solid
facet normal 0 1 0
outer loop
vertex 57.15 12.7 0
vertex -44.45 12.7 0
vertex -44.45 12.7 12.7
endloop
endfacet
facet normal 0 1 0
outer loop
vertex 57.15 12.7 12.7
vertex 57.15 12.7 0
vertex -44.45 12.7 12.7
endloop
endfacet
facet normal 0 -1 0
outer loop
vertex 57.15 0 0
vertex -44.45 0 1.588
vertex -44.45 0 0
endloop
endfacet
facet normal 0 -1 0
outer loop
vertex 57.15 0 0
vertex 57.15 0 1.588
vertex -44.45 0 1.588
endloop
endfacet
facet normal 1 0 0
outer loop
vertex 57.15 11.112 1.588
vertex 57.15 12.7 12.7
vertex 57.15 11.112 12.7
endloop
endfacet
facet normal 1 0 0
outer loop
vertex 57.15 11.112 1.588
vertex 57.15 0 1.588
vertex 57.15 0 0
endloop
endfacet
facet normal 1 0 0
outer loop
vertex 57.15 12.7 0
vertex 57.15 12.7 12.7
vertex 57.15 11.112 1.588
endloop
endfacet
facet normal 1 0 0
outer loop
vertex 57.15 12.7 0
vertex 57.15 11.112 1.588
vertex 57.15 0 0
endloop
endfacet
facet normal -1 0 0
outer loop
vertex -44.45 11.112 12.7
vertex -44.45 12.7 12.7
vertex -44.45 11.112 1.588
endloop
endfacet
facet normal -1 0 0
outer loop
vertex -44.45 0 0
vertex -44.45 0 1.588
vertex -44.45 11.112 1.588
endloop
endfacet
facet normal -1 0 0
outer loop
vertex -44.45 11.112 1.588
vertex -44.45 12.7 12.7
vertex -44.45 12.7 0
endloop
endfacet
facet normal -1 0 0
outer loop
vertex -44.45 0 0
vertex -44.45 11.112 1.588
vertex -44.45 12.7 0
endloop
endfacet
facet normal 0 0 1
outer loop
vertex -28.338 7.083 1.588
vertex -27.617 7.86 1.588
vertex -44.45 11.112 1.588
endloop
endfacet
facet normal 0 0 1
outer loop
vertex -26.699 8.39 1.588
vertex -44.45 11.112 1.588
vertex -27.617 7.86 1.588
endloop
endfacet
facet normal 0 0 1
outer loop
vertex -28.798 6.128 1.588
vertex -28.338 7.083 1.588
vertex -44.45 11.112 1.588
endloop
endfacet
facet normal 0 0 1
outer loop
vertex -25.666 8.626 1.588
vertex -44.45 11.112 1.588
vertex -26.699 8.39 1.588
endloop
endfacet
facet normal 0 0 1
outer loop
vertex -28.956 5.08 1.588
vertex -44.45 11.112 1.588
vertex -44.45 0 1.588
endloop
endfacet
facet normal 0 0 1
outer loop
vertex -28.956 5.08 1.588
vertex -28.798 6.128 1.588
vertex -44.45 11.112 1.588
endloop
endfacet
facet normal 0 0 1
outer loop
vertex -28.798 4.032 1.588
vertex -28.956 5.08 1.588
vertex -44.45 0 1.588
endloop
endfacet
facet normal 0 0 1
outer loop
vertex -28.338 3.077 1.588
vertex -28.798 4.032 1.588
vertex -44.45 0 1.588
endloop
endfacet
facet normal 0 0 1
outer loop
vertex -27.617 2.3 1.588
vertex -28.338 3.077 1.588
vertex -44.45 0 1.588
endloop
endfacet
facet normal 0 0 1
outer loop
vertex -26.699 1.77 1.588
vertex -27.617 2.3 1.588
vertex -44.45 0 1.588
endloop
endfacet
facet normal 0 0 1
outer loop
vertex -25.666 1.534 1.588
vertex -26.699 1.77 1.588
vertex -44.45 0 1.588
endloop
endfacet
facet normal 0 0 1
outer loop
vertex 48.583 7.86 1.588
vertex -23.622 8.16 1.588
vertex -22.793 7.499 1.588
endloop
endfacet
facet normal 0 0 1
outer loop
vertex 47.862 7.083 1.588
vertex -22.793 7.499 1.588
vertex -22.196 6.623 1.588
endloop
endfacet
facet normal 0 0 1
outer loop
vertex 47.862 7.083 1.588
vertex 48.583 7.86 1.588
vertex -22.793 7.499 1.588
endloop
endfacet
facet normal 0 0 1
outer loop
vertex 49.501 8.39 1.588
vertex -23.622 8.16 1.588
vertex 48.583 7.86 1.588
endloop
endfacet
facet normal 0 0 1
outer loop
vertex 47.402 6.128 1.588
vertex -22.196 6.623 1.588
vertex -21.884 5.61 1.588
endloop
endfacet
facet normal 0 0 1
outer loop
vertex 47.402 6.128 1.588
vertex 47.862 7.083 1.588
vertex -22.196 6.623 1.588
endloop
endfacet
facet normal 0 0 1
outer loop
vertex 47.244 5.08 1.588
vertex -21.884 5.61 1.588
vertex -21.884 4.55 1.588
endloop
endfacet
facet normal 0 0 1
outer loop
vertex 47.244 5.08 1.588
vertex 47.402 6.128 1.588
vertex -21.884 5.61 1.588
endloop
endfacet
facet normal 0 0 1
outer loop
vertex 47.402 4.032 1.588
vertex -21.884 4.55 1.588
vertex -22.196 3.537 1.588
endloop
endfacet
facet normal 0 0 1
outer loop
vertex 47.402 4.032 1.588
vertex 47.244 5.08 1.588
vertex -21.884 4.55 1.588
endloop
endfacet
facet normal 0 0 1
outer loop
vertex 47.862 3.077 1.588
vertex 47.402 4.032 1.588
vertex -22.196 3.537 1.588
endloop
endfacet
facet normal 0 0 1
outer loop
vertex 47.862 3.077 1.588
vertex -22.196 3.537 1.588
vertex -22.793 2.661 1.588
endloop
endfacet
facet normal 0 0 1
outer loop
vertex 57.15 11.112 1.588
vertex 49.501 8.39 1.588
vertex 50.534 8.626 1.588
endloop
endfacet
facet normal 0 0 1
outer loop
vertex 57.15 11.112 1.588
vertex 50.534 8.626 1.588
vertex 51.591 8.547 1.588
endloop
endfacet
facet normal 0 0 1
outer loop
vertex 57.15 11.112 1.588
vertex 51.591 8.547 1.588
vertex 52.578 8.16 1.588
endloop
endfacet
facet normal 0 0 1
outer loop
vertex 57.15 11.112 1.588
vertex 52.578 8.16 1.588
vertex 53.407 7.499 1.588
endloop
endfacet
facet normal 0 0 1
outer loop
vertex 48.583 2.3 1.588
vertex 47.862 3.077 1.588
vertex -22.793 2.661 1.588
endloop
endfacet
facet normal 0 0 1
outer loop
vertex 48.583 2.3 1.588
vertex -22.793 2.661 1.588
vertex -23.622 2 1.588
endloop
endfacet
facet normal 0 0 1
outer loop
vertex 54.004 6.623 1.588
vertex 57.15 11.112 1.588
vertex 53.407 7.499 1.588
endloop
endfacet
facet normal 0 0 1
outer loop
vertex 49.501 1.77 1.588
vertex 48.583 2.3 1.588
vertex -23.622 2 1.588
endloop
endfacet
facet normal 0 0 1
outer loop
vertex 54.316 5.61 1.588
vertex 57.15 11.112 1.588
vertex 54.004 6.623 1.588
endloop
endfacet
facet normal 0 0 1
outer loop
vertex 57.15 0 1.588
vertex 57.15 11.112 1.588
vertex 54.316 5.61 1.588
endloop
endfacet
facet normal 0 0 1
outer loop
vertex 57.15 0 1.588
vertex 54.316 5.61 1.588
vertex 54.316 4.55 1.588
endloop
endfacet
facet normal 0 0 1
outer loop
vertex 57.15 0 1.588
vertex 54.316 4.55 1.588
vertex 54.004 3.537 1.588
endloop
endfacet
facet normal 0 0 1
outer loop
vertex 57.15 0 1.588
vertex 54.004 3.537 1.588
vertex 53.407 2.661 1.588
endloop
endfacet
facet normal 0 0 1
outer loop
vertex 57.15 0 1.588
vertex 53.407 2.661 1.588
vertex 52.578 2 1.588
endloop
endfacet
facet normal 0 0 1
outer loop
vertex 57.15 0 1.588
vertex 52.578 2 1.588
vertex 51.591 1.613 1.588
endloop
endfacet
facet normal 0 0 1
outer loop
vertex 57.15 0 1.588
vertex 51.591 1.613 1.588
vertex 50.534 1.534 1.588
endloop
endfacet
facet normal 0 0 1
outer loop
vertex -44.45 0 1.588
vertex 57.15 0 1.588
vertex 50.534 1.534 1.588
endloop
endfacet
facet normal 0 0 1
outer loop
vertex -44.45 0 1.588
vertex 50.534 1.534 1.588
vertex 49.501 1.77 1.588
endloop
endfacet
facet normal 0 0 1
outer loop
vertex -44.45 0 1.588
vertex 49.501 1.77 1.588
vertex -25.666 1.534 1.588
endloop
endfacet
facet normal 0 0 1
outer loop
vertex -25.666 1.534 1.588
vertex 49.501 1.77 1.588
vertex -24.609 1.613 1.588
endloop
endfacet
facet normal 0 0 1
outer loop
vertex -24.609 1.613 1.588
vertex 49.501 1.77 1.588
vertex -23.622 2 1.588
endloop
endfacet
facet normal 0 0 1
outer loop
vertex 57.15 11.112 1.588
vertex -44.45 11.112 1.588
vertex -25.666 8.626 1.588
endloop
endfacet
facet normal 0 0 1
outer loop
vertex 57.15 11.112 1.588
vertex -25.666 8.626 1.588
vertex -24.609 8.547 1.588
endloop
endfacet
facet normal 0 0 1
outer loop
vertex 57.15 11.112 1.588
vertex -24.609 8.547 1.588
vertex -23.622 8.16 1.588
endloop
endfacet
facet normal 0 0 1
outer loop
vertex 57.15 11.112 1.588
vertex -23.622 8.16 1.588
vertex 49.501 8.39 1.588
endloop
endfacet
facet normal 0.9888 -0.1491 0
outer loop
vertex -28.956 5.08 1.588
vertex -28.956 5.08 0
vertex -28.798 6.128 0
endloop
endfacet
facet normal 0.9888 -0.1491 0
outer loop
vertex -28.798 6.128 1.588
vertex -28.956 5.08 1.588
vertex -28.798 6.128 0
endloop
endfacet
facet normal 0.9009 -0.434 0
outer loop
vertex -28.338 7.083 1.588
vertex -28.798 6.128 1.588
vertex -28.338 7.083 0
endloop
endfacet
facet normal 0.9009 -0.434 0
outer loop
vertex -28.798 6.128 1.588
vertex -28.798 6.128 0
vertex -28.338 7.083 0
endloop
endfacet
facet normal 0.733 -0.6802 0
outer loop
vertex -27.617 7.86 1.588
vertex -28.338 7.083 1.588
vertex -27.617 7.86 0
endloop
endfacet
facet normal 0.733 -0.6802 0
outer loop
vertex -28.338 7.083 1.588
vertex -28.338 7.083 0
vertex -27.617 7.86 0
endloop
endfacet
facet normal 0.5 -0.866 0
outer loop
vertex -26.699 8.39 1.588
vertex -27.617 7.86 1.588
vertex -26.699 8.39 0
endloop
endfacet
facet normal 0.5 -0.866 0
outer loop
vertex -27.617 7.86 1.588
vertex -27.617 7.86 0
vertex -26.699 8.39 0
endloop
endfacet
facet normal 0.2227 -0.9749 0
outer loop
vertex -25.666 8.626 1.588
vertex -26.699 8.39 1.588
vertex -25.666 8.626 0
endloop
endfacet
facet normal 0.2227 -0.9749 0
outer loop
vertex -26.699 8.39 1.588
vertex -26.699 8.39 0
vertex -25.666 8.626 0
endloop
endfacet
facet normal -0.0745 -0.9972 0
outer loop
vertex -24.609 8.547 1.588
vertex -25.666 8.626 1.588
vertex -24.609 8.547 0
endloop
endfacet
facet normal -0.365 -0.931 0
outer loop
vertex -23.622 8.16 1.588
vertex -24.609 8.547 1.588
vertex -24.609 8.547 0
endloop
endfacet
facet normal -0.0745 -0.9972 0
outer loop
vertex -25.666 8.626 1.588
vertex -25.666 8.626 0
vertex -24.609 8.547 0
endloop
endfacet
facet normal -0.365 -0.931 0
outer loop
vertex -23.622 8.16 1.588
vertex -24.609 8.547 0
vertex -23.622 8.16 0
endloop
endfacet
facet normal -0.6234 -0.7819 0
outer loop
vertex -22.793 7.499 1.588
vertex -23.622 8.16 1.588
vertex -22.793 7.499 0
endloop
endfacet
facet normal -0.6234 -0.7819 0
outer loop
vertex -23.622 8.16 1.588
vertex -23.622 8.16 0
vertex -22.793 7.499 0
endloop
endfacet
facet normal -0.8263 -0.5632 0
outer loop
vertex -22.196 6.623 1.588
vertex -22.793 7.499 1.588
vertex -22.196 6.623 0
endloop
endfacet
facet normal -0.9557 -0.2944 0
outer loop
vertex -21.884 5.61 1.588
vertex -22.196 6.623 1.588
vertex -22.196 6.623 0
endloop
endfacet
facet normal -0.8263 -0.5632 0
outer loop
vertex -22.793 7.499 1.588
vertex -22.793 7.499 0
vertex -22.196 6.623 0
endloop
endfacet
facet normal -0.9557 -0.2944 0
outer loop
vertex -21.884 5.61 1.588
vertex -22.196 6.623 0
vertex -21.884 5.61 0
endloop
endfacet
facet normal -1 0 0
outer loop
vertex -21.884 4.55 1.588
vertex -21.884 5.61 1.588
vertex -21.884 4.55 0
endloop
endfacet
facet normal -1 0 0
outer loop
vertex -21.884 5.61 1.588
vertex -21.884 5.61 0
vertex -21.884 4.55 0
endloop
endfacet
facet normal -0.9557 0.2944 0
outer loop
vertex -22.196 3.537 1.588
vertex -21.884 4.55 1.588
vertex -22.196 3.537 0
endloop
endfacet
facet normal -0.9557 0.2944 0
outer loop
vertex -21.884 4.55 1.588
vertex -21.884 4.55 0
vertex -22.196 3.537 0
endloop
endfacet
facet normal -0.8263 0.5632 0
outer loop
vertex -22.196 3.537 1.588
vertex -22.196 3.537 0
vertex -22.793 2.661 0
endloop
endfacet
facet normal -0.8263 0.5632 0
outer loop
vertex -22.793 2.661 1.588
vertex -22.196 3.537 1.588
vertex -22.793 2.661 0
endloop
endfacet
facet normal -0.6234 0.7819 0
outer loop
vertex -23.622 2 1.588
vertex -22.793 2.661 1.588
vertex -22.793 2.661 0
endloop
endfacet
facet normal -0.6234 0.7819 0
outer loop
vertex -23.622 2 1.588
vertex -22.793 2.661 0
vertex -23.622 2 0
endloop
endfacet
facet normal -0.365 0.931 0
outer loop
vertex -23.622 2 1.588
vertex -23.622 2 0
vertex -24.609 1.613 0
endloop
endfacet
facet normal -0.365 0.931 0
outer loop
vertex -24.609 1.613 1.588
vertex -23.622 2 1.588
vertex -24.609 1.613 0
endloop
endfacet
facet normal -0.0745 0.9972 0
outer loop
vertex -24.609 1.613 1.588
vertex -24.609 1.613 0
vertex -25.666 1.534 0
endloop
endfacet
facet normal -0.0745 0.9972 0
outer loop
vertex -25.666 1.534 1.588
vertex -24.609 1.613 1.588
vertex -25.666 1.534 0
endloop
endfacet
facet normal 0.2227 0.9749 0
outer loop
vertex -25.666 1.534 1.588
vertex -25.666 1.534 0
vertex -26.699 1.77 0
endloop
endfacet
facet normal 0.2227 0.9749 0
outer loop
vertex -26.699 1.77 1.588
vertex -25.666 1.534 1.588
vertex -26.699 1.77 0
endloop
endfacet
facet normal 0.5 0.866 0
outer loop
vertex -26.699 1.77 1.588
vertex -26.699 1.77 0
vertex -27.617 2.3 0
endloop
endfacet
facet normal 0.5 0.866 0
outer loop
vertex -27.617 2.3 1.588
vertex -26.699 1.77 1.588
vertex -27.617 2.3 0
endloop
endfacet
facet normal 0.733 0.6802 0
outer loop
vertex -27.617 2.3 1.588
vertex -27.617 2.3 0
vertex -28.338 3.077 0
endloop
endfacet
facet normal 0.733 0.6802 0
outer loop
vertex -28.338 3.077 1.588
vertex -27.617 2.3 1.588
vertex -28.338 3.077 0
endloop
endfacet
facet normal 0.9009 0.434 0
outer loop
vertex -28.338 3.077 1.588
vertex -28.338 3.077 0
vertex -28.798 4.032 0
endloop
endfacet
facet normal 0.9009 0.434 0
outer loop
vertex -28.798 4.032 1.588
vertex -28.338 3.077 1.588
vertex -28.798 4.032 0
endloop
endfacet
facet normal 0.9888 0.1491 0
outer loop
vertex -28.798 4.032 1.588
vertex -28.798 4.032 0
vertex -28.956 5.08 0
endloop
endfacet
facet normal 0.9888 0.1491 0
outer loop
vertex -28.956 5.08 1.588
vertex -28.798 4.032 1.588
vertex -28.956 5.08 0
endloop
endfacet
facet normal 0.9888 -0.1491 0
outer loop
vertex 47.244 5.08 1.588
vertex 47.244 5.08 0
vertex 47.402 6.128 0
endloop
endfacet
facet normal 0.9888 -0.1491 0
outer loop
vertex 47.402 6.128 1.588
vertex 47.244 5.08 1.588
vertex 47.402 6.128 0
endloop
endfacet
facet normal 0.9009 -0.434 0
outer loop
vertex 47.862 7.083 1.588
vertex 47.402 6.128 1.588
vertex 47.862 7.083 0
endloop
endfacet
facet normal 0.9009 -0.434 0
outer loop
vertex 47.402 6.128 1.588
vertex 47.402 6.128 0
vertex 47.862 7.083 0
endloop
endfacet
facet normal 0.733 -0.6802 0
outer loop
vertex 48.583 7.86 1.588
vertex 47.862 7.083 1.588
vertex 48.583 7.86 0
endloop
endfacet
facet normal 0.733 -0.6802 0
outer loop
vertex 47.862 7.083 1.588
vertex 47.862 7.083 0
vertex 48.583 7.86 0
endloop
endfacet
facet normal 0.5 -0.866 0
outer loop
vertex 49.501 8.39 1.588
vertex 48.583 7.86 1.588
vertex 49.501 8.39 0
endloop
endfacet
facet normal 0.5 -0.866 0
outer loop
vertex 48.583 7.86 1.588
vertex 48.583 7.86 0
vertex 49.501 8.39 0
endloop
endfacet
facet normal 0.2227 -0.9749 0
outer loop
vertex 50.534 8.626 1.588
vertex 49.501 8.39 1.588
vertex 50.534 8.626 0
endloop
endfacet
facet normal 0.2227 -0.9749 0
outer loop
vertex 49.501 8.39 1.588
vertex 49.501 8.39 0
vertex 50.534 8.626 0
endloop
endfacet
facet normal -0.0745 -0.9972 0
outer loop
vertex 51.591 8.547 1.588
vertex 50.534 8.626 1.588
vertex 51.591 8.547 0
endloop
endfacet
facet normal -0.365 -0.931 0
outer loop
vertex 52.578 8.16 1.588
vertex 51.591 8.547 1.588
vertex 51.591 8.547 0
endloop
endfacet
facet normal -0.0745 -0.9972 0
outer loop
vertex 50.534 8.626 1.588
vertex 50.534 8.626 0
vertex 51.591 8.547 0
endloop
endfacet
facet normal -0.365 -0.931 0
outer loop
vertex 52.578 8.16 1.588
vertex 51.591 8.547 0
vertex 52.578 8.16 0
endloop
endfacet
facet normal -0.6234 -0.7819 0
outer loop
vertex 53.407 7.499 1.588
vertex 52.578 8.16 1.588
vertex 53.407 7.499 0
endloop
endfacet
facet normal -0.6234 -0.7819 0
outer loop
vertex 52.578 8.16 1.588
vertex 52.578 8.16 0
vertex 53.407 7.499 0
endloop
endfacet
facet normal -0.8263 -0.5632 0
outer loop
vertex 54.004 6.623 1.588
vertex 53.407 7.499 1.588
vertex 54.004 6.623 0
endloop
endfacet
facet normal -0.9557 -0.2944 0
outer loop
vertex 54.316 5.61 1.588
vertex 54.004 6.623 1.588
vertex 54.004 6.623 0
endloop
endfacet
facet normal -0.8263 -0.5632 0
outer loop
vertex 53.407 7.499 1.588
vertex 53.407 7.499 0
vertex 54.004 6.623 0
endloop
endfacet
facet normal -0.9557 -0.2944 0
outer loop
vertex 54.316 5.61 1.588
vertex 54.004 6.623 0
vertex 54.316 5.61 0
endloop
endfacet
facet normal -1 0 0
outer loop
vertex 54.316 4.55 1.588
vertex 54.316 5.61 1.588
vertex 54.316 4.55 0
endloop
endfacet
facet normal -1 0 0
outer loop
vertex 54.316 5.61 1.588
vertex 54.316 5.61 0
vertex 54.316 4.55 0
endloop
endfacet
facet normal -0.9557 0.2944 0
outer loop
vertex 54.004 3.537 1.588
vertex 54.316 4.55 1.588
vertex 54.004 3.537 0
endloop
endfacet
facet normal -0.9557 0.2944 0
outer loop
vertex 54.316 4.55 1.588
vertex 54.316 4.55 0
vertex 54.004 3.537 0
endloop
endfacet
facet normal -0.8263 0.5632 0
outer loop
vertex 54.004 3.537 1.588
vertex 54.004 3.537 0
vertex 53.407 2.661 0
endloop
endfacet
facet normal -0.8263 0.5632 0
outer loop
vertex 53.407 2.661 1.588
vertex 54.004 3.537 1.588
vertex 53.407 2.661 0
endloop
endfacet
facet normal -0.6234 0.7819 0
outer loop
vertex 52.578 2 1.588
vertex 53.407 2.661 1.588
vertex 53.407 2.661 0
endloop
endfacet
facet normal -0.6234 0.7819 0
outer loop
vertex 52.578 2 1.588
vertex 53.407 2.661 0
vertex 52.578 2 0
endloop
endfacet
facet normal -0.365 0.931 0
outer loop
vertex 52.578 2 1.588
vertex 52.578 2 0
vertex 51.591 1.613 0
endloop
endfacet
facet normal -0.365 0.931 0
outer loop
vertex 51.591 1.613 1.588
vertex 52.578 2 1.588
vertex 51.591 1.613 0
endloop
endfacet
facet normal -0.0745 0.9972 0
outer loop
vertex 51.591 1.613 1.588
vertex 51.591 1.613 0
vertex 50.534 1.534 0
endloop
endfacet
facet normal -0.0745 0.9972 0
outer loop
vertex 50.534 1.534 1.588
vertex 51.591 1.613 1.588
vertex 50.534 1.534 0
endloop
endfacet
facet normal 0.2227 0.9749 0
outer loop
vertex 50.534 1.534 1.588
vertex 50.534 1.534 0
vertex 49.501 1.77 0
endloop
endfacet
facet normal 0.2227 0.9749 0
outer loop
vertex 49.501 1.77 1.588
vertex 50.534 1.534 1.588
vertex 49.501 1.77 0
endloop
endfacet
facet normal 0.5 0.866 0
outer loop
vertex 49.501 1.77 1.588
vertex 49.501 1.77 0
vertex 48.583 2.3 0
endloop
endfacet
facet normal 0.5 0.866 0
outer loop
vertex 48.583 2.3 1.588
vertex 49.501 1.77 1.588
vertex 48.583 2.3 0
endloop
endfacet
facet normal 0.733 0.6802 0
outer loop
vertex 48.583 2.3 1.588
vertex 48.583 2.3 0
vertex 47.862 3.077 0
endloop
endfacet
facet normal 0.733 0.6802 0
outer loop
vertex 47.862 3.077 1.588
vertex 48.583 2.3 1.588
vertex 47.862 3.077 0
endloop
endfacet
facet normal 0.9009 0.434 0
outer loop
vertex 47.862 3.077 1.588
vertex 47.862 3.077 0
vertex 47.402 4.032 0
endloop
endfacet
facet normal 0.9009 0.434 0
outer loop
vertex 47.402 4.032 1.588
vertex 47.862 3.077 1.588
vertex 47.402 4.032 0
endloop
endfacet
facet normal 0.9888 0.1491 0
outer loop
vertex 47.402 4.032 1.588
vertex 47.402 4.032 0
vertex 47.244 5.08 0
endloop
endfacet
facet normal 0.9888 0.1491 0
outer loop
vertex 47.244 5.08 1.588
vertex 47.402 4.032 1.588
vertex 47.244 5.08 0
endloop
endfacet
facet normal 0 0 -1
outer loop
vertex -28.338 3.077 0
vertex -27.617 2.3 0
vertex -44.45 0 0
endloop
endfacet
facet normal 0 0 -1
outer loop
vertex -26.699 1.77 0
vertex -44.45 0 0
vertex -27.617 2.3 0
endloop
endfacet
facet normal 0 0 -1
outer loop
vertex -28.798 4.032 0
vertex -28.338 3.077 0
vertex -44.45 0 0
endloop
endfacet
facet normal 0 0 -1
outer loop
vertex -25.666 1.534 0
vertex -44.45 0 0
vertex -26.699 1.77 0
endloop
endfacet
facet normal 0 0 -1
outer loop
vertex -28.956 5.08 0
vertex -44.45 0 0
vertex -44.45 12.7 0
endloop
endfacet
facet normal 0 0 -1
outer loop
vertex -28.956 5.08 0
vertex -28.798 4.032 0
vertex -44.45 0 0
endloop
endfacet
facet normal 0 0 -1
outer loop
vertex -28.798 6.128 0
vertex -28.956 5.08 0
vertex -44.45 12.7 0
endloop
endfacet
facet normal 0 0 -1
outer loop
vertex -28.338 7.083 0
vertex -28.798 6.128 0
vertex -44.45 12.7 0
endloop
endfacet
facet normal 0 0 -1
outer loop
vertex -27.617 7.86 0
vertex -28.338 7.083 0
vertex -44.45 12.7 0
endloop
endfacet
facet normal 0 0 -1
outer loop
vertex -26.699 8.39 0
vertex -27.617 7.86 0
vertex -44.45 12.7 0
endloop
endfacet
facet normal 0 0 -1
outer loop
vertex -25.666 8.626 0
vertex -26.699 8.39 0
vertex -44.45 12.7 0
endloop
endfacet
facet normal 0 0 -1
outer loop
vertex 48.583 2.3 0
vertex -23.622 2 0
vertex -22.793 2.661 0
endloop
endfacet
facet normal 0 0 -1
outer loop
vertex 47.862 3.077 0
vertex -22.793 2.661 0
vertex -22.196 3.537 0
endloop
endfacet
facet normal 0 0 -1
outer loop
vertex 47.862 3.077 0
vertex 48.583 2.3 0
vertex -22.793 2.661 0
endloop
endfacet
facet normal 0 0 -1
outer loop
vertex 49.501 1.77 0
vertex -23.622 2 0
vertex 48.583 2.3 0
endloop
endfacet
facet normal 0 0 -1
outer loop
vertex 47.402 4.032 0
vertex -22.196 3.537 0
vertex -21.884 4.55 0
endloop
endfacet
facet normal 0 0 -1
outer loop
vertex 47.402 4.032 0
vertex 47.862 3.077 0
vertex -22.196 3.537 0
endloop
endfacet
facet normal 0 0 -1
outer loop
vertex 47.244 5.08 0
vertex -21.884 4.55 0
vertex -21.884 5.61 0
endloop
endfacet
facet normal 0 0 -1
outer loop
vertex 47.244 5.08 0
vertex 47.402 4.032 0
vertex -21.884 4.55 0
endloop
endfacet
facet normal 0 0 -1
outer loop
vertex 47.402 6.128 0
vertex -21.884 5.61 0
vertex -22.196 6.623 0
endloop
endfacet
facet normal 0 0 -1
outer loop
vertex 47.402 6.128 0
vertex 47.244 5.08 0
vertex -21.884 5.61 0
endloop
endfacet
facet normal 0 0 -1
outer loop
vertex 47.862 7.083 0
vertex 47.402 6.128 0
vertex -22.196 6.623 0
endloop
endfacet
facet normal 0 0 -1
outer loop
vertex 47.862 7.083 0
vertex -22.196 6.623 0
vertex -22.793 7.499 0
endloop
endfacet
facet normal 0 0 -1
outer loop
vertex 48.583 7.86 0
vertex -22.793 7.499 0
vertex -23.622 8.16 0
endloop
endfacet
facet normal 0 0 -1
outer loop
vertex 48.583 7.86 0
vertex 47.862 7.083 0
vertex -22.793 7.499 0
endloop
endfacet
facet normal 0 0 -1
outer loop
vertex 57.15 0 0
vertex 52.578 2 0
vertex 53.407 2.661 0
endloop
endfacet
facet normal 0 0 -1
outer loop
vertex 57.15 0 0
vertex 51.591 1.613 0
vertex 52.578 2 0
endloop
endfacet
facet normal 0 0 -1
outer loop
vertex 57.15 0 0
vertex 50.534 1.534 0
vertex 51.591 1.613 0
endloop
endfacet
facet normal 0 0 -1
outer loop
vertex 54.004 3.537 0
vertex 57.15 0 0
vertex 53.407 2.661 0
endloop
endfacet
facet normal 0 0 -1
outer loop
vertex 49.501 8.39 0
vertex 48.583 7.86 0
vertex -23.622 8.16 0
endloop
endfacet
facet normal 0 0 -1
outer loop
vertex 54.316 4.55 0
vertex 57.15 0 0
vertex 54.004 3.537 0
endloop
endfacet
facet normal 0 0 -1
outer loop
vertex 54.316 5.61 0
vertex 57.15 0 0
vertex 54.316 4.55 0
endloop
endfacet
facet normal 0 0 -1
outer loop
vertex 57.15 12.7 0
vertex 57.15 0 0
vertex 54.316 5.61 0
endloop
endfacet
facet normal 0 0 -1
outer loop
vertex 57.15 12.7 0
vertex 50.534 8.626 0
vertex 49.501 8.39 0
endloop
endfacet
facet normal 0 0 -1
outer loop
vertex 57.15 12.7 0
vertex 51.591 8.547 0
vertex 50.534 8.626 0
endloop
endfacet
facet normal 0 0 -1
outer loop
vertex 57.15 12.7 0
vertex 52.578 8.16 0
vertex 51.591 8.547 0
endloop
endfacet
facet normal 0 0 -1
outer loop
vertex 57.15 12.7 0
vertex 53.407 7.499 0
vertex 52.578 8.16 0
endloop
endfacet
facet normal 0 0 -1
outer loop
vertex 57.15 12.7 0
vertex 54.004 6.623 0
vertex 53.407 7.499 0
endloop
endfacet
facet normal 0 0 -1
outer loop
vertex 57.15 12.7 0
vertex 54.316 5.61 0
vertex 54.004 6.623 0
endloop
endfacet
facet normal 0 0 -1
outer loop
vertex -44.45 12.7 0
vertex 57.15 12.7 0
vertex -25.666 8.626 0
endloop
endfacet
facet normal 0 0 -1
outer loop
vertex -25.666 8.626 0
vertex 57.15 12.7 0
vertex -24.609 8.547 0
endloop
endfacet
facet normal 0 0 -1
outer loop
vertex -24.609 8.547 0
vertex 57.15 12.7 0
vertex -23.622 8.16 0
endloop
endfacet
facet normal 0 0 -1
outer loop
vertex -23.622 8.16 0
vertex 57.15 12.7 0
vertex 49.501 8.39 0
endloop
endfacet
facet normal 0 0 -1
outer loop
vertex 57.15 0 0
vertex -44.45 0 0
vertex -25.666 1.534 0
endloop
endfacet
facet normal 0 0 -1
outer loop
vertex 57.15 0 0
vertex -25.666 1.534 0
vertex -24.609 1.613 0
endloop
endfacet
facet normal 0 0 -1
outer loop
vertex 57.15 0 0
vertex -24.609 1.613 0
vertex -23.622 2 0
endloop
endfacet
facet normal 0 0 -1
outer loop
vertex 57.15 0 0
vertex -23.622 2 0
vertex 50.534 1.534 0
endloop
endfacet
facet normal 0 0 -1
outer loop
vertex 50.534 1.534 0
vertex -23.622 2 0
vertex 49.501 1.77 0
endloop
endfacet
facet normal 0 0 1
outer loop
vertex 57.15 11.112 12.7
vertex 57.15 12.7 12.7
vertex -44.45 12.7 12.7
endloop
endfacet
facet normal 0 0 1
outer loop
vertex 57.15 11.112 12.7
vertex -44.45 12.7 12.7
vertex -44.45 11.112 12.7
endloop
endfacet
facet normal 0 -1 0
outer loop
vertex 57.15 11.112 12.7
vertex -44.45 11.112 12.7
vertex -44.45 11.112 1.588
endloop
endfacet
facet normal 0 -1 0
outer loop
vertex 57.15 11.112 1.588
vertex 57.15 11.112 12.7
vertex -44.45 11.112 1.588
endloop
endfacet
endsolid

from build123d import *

# Parameters (mm, degrees)
BOSS_EXTRUDE1_DEPTH      = 57.15
BOSS_EXTRUDE1_DEPTH_BACK = 44.45
SKETCH3_R                = 3.556
CUT_EXTRUDE1_DEPTH       = 13.7


with BuildPart() as part:
    # Sketch1 → Boss-Extrude1 (new body, two sides)
    with BuildSketch(Plane(origin=(0, 0, 0), x_dir=(0, 0, -1), z_dir=(1, 0, 0))) as boss_extrude1_sk:
        Polygon((0, 0), (0, 12.7), (-12.7, 12.7), (-12.7, 11.1125), (-1.5875, 11.1125), (-1.5875, 0), align=None)
    extrude(amount=BOSS_EXTRUDE1_DEPTH)
    extrude(boss_extrude1_sk.sketch, amount=-BOSS_EXTRUDE1_DEPTH_BACK)

    # Sketch3 → Cut-Extrude1 (cut, through all)
    with BuildSketch(Plane(origin=(0, 0, 0), x_dir=(-1, 0, 0), z_dir=(0, 0, -1))):
        with Locations((25.4, 5.08)):
            Circle(SKETCH3_R)
        with Locations((-50.8, 5.08)):
            Circle(SKETCH3_R)
    extrude(amount=-CUT_EXTRUDE1_DEPTH, mode=Mode.SUBTRACT)


solid = part.part
